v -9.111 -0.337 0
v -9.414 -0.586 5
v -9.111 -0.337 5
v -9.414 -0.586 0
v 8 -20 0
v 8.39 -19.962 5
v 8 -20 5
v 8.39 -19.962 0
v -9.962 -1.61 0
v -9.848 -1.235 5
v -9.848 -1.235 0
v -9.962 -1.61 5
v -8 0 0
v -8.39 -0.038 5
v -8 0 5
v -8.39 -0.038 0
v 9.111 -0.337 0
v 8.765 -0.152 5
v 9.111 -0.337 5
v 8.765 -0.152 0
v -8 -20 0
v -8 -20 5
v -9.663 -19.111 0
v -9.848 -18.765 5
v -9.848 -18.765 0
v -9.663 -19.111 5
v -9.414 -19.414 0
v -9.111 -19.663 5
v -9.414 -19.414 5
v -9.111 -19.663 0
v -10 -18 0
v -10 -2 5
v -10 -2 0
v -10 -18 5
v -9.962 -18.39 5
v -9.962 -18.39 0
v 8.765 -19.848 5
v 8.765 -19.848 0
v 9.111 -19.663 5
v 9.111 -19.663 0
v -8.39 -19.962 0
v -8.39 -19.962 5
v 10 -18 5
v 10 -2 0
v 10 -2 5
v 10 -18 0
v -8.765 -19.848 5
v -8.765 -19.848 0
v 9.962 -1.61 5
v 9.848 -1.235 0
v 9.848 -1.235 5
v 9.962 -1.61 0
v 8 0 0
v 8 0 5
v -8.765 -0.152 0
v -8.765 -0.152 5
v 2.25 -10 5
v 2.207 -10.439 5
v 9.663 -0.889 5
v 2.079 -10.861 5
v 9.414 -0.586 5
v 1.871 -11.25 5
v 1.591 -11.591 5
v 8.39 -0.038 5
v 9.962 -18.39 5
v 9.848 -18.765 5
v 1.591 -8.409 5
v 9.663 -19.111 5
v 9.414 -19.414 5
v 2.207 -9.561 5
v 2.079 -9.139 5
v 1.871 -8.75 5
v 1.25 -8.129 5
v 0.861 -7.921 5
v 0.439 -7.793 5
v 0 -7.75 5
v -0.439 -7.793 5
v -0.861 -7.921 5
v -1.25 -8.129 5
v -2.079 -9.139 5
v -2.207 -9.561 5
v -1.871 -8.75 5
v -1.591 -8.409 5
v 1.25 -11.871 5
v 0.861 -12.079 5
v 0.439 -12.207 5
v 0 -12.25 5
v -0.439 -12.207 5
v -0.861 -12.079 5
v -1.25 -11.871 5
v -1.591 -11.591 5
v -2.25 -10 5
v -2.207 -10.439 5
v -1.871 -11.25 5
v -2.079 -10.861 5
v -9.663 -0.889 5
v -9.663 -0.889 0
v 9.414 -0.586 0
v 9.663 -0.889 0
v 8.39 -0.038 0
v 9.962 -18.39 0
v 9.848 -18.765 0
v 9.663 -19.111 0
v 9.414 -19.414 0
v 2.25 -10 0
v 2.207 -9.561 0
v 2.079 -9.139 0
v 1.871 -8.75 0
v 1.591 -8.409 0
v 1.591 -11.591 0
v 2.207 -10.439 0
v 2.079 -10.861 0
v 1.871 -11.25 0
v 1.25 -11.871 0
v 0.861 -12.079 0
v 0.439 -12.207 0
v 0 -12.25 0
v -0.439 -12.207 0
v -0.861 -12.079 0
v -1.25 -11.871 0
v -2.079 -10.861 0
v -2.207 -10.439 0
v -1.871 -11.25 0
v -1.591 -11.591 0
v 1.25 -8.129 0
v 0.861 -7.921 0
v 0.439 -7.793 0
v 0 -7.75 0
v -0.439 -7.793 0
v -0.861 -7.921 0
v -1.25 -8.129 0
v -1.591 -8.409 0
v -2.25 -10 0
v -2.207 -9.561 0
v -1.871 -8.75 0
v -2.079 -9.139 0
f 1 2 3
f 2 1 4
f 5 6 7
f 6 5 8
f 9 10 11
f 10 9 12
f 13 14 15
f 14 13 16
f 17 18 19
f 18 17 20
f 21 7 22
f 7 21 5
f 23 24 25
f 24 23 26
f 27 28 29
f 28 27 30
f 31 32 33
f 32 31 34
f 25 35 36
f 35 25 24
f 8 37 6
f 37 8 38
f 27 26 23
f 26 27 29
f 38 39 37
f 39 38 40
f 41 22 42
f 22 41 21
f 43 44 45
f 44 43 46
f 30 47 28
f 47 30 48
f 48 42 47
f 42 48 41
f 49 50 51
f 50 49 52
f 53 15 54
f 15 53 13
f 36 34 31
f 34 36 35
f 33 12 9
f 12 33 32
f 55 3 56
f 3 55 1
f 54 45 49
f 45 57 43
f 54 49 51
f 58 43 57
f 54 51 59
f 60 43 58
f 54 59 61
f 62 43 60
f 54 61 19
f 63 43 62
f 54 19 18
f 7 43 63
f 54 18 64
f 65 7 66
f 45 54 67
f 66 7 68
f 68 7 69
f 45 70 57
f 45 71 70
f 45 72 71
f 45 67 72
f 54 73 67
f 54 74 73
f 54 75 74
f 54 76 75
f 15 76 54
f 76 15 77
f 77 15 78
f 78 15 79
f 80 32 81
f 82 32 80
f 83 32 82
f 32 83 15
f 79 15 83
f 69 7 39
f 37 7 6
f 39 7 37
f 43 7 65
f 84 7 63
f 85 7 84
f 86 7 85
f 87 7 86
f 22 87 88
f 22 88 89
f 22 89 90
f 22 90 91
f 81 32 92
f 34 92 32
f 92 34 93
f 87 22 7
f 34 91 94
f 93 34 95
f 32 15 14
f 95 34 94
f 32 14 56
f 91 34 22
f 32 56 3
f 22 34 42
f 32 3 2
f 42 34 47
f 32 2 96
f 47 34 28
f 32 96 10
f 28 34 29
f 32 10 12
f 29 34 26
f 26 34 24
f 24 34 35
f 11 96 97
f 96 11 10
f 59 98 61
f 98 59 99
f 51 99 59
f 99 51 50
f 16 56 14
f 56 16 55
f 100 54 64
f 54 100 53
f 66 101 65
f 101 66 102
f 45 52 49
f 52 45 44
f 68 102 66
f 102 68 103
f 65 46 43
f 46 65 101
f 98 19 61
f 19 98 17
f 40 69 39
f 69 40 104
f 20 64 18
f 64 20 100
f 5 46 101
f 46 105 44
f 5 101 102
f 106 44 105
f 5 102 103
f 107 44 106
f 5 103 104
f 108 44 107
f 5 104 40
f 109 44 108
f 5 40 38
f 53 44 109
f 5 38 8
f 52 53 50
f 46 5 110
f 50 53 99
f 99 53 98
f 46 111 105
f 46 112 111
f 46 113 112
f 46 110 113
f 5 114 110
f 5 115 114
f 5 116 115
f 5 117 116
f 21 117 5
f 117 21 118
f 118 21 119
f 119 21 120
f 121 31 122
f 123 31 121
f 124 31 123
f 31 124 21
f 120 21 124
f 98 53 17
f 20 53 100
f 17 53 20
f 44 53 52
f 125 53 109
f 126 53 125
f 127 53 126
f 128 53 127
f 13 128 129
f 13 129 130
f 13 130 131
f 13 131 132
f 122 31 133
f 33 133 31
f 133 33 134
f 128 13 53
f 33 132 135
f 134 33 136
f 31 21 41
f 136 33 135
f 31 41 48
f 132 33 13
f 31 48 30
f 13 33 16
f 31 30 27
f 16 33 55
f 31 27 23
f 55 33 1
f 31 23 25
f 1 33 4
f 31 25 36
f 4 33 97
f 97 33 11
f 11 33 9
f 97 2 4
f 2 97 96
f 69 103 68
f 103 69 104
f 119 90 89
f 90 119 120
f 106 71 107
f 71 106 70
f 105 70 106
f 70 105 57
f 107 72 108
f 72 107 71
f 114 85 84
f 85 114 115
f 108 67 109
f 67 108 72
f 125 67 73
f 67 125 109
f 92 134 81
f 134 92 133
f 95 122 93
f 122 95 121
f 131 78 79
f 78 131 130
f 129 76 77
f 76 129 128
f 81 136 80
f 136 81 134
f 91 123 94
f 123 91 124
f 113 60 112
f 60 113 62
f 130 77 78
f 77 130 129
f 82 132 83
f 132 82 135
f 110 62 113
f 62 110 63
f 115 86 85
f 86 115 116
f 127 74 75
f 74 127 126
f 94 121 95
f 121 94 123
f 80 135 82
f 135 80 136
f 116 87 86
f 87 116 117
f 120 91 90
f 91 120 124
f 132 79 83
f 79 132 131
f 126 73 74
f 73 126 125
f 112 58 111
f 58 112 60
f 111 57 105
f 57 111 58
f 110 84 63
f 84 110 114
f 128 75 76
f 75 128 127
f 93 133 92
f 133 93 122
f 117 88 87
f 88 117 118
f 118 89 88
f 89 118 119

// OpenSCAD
//By Coat, 29-jul-2018
//Licensed under the Creative Commons - Attribution license.

//primary parameters 
//The height of the spacer (mm)
spacerlength = 20;
//Thickness of the mounting spacer (mm, left and right)
spacerthick = 5;
//Round corners Yes (1) or No (0)
roundcorner = 1;
//If using round corners use this radius (mm)
cornerrad = 2;
//Ridge for aligning with 2020 alu frame , Yes (1) or No (0)
ridge2020 = 0;
//Diameter of the mountingholes
mholediam = 4.5;
//The mountingholes: give the position of the center in mm.
mhole01y = 10;
//Position center mountinghole 2 (0 = disabled):
mhole02y = 0;
//Position center mountinghole 3 (0 = disabled):
mhole03y = 0;
//Position center mountinghole 4 (0 = disabled):
mhole04y = 0;

module corner(cr, pt)
{
  if (roundcorner)
  {
    $fn = 32;
    cylinder(r=cr, h = pt);
  }
  else
  {
    $fn = 4;
    rotate([0,0,45])
    cylinder(r=sqrt(2)*cr, h = pt);
  } 
}

module hullspacer(dx,dy,cr,pt)
{
  hull()
  {
    translate([dx, dy,0])    //topright
      corner(cr, pt);
    translate([-dx, dy,0])    //topleft
      corner(cr, pt);
    translate([-dx, -dy,0])   //bottomleft
      corner(cr, pt);
    translate([dx, -dy,0])   //bottomright
      corner(cr, pt);
  }
}

module spacer()
{
  union()
  {
    hullspacer(0.5* spacerwidth- cornerrad2,    
               0.5*spacerlength - cornerrad2,
               cornerrad2,                   
               spacerthick);                 

    if(ridge2020)   
       translate([rx,0,0.5*rt + spacerthick]) 
         cube([rw,spacerlength,rt], center = true); 
  }
}

module mountinghole(xmh,ymh,diamh)
{
  if (xmh!=0||ymh!=0)
  { 
     $fn=32;
     translate([xmh,-ymh,0]) 
       cylinder(d = diamh, h = 3*(spacerthick + rt), center=true); 
  }  
}  


//Main
//secondary parameters
spacerwidth = 20;
rx = 0;    //position ridge
rt=1.4;     //thickness ridge
rw = 5.8; //width ridge

//recalculated parameters
cornerrad2 = min(max(cornerrad,1), 0.5*spacerlength, 0.5*spacerwidth);

//the Thing
difference()
{
  union()
  {
    translate([0,-0.5*spacerlength,0])
      spacer();
  }
  mountinghole(0,mhole01y, mholediam);
  mountinghole(0,mhole02y, mholediam);
  mountinghole(0,mhole03y, mholediam);
  mountinghole(0,mhole04y, mholediam);
}
